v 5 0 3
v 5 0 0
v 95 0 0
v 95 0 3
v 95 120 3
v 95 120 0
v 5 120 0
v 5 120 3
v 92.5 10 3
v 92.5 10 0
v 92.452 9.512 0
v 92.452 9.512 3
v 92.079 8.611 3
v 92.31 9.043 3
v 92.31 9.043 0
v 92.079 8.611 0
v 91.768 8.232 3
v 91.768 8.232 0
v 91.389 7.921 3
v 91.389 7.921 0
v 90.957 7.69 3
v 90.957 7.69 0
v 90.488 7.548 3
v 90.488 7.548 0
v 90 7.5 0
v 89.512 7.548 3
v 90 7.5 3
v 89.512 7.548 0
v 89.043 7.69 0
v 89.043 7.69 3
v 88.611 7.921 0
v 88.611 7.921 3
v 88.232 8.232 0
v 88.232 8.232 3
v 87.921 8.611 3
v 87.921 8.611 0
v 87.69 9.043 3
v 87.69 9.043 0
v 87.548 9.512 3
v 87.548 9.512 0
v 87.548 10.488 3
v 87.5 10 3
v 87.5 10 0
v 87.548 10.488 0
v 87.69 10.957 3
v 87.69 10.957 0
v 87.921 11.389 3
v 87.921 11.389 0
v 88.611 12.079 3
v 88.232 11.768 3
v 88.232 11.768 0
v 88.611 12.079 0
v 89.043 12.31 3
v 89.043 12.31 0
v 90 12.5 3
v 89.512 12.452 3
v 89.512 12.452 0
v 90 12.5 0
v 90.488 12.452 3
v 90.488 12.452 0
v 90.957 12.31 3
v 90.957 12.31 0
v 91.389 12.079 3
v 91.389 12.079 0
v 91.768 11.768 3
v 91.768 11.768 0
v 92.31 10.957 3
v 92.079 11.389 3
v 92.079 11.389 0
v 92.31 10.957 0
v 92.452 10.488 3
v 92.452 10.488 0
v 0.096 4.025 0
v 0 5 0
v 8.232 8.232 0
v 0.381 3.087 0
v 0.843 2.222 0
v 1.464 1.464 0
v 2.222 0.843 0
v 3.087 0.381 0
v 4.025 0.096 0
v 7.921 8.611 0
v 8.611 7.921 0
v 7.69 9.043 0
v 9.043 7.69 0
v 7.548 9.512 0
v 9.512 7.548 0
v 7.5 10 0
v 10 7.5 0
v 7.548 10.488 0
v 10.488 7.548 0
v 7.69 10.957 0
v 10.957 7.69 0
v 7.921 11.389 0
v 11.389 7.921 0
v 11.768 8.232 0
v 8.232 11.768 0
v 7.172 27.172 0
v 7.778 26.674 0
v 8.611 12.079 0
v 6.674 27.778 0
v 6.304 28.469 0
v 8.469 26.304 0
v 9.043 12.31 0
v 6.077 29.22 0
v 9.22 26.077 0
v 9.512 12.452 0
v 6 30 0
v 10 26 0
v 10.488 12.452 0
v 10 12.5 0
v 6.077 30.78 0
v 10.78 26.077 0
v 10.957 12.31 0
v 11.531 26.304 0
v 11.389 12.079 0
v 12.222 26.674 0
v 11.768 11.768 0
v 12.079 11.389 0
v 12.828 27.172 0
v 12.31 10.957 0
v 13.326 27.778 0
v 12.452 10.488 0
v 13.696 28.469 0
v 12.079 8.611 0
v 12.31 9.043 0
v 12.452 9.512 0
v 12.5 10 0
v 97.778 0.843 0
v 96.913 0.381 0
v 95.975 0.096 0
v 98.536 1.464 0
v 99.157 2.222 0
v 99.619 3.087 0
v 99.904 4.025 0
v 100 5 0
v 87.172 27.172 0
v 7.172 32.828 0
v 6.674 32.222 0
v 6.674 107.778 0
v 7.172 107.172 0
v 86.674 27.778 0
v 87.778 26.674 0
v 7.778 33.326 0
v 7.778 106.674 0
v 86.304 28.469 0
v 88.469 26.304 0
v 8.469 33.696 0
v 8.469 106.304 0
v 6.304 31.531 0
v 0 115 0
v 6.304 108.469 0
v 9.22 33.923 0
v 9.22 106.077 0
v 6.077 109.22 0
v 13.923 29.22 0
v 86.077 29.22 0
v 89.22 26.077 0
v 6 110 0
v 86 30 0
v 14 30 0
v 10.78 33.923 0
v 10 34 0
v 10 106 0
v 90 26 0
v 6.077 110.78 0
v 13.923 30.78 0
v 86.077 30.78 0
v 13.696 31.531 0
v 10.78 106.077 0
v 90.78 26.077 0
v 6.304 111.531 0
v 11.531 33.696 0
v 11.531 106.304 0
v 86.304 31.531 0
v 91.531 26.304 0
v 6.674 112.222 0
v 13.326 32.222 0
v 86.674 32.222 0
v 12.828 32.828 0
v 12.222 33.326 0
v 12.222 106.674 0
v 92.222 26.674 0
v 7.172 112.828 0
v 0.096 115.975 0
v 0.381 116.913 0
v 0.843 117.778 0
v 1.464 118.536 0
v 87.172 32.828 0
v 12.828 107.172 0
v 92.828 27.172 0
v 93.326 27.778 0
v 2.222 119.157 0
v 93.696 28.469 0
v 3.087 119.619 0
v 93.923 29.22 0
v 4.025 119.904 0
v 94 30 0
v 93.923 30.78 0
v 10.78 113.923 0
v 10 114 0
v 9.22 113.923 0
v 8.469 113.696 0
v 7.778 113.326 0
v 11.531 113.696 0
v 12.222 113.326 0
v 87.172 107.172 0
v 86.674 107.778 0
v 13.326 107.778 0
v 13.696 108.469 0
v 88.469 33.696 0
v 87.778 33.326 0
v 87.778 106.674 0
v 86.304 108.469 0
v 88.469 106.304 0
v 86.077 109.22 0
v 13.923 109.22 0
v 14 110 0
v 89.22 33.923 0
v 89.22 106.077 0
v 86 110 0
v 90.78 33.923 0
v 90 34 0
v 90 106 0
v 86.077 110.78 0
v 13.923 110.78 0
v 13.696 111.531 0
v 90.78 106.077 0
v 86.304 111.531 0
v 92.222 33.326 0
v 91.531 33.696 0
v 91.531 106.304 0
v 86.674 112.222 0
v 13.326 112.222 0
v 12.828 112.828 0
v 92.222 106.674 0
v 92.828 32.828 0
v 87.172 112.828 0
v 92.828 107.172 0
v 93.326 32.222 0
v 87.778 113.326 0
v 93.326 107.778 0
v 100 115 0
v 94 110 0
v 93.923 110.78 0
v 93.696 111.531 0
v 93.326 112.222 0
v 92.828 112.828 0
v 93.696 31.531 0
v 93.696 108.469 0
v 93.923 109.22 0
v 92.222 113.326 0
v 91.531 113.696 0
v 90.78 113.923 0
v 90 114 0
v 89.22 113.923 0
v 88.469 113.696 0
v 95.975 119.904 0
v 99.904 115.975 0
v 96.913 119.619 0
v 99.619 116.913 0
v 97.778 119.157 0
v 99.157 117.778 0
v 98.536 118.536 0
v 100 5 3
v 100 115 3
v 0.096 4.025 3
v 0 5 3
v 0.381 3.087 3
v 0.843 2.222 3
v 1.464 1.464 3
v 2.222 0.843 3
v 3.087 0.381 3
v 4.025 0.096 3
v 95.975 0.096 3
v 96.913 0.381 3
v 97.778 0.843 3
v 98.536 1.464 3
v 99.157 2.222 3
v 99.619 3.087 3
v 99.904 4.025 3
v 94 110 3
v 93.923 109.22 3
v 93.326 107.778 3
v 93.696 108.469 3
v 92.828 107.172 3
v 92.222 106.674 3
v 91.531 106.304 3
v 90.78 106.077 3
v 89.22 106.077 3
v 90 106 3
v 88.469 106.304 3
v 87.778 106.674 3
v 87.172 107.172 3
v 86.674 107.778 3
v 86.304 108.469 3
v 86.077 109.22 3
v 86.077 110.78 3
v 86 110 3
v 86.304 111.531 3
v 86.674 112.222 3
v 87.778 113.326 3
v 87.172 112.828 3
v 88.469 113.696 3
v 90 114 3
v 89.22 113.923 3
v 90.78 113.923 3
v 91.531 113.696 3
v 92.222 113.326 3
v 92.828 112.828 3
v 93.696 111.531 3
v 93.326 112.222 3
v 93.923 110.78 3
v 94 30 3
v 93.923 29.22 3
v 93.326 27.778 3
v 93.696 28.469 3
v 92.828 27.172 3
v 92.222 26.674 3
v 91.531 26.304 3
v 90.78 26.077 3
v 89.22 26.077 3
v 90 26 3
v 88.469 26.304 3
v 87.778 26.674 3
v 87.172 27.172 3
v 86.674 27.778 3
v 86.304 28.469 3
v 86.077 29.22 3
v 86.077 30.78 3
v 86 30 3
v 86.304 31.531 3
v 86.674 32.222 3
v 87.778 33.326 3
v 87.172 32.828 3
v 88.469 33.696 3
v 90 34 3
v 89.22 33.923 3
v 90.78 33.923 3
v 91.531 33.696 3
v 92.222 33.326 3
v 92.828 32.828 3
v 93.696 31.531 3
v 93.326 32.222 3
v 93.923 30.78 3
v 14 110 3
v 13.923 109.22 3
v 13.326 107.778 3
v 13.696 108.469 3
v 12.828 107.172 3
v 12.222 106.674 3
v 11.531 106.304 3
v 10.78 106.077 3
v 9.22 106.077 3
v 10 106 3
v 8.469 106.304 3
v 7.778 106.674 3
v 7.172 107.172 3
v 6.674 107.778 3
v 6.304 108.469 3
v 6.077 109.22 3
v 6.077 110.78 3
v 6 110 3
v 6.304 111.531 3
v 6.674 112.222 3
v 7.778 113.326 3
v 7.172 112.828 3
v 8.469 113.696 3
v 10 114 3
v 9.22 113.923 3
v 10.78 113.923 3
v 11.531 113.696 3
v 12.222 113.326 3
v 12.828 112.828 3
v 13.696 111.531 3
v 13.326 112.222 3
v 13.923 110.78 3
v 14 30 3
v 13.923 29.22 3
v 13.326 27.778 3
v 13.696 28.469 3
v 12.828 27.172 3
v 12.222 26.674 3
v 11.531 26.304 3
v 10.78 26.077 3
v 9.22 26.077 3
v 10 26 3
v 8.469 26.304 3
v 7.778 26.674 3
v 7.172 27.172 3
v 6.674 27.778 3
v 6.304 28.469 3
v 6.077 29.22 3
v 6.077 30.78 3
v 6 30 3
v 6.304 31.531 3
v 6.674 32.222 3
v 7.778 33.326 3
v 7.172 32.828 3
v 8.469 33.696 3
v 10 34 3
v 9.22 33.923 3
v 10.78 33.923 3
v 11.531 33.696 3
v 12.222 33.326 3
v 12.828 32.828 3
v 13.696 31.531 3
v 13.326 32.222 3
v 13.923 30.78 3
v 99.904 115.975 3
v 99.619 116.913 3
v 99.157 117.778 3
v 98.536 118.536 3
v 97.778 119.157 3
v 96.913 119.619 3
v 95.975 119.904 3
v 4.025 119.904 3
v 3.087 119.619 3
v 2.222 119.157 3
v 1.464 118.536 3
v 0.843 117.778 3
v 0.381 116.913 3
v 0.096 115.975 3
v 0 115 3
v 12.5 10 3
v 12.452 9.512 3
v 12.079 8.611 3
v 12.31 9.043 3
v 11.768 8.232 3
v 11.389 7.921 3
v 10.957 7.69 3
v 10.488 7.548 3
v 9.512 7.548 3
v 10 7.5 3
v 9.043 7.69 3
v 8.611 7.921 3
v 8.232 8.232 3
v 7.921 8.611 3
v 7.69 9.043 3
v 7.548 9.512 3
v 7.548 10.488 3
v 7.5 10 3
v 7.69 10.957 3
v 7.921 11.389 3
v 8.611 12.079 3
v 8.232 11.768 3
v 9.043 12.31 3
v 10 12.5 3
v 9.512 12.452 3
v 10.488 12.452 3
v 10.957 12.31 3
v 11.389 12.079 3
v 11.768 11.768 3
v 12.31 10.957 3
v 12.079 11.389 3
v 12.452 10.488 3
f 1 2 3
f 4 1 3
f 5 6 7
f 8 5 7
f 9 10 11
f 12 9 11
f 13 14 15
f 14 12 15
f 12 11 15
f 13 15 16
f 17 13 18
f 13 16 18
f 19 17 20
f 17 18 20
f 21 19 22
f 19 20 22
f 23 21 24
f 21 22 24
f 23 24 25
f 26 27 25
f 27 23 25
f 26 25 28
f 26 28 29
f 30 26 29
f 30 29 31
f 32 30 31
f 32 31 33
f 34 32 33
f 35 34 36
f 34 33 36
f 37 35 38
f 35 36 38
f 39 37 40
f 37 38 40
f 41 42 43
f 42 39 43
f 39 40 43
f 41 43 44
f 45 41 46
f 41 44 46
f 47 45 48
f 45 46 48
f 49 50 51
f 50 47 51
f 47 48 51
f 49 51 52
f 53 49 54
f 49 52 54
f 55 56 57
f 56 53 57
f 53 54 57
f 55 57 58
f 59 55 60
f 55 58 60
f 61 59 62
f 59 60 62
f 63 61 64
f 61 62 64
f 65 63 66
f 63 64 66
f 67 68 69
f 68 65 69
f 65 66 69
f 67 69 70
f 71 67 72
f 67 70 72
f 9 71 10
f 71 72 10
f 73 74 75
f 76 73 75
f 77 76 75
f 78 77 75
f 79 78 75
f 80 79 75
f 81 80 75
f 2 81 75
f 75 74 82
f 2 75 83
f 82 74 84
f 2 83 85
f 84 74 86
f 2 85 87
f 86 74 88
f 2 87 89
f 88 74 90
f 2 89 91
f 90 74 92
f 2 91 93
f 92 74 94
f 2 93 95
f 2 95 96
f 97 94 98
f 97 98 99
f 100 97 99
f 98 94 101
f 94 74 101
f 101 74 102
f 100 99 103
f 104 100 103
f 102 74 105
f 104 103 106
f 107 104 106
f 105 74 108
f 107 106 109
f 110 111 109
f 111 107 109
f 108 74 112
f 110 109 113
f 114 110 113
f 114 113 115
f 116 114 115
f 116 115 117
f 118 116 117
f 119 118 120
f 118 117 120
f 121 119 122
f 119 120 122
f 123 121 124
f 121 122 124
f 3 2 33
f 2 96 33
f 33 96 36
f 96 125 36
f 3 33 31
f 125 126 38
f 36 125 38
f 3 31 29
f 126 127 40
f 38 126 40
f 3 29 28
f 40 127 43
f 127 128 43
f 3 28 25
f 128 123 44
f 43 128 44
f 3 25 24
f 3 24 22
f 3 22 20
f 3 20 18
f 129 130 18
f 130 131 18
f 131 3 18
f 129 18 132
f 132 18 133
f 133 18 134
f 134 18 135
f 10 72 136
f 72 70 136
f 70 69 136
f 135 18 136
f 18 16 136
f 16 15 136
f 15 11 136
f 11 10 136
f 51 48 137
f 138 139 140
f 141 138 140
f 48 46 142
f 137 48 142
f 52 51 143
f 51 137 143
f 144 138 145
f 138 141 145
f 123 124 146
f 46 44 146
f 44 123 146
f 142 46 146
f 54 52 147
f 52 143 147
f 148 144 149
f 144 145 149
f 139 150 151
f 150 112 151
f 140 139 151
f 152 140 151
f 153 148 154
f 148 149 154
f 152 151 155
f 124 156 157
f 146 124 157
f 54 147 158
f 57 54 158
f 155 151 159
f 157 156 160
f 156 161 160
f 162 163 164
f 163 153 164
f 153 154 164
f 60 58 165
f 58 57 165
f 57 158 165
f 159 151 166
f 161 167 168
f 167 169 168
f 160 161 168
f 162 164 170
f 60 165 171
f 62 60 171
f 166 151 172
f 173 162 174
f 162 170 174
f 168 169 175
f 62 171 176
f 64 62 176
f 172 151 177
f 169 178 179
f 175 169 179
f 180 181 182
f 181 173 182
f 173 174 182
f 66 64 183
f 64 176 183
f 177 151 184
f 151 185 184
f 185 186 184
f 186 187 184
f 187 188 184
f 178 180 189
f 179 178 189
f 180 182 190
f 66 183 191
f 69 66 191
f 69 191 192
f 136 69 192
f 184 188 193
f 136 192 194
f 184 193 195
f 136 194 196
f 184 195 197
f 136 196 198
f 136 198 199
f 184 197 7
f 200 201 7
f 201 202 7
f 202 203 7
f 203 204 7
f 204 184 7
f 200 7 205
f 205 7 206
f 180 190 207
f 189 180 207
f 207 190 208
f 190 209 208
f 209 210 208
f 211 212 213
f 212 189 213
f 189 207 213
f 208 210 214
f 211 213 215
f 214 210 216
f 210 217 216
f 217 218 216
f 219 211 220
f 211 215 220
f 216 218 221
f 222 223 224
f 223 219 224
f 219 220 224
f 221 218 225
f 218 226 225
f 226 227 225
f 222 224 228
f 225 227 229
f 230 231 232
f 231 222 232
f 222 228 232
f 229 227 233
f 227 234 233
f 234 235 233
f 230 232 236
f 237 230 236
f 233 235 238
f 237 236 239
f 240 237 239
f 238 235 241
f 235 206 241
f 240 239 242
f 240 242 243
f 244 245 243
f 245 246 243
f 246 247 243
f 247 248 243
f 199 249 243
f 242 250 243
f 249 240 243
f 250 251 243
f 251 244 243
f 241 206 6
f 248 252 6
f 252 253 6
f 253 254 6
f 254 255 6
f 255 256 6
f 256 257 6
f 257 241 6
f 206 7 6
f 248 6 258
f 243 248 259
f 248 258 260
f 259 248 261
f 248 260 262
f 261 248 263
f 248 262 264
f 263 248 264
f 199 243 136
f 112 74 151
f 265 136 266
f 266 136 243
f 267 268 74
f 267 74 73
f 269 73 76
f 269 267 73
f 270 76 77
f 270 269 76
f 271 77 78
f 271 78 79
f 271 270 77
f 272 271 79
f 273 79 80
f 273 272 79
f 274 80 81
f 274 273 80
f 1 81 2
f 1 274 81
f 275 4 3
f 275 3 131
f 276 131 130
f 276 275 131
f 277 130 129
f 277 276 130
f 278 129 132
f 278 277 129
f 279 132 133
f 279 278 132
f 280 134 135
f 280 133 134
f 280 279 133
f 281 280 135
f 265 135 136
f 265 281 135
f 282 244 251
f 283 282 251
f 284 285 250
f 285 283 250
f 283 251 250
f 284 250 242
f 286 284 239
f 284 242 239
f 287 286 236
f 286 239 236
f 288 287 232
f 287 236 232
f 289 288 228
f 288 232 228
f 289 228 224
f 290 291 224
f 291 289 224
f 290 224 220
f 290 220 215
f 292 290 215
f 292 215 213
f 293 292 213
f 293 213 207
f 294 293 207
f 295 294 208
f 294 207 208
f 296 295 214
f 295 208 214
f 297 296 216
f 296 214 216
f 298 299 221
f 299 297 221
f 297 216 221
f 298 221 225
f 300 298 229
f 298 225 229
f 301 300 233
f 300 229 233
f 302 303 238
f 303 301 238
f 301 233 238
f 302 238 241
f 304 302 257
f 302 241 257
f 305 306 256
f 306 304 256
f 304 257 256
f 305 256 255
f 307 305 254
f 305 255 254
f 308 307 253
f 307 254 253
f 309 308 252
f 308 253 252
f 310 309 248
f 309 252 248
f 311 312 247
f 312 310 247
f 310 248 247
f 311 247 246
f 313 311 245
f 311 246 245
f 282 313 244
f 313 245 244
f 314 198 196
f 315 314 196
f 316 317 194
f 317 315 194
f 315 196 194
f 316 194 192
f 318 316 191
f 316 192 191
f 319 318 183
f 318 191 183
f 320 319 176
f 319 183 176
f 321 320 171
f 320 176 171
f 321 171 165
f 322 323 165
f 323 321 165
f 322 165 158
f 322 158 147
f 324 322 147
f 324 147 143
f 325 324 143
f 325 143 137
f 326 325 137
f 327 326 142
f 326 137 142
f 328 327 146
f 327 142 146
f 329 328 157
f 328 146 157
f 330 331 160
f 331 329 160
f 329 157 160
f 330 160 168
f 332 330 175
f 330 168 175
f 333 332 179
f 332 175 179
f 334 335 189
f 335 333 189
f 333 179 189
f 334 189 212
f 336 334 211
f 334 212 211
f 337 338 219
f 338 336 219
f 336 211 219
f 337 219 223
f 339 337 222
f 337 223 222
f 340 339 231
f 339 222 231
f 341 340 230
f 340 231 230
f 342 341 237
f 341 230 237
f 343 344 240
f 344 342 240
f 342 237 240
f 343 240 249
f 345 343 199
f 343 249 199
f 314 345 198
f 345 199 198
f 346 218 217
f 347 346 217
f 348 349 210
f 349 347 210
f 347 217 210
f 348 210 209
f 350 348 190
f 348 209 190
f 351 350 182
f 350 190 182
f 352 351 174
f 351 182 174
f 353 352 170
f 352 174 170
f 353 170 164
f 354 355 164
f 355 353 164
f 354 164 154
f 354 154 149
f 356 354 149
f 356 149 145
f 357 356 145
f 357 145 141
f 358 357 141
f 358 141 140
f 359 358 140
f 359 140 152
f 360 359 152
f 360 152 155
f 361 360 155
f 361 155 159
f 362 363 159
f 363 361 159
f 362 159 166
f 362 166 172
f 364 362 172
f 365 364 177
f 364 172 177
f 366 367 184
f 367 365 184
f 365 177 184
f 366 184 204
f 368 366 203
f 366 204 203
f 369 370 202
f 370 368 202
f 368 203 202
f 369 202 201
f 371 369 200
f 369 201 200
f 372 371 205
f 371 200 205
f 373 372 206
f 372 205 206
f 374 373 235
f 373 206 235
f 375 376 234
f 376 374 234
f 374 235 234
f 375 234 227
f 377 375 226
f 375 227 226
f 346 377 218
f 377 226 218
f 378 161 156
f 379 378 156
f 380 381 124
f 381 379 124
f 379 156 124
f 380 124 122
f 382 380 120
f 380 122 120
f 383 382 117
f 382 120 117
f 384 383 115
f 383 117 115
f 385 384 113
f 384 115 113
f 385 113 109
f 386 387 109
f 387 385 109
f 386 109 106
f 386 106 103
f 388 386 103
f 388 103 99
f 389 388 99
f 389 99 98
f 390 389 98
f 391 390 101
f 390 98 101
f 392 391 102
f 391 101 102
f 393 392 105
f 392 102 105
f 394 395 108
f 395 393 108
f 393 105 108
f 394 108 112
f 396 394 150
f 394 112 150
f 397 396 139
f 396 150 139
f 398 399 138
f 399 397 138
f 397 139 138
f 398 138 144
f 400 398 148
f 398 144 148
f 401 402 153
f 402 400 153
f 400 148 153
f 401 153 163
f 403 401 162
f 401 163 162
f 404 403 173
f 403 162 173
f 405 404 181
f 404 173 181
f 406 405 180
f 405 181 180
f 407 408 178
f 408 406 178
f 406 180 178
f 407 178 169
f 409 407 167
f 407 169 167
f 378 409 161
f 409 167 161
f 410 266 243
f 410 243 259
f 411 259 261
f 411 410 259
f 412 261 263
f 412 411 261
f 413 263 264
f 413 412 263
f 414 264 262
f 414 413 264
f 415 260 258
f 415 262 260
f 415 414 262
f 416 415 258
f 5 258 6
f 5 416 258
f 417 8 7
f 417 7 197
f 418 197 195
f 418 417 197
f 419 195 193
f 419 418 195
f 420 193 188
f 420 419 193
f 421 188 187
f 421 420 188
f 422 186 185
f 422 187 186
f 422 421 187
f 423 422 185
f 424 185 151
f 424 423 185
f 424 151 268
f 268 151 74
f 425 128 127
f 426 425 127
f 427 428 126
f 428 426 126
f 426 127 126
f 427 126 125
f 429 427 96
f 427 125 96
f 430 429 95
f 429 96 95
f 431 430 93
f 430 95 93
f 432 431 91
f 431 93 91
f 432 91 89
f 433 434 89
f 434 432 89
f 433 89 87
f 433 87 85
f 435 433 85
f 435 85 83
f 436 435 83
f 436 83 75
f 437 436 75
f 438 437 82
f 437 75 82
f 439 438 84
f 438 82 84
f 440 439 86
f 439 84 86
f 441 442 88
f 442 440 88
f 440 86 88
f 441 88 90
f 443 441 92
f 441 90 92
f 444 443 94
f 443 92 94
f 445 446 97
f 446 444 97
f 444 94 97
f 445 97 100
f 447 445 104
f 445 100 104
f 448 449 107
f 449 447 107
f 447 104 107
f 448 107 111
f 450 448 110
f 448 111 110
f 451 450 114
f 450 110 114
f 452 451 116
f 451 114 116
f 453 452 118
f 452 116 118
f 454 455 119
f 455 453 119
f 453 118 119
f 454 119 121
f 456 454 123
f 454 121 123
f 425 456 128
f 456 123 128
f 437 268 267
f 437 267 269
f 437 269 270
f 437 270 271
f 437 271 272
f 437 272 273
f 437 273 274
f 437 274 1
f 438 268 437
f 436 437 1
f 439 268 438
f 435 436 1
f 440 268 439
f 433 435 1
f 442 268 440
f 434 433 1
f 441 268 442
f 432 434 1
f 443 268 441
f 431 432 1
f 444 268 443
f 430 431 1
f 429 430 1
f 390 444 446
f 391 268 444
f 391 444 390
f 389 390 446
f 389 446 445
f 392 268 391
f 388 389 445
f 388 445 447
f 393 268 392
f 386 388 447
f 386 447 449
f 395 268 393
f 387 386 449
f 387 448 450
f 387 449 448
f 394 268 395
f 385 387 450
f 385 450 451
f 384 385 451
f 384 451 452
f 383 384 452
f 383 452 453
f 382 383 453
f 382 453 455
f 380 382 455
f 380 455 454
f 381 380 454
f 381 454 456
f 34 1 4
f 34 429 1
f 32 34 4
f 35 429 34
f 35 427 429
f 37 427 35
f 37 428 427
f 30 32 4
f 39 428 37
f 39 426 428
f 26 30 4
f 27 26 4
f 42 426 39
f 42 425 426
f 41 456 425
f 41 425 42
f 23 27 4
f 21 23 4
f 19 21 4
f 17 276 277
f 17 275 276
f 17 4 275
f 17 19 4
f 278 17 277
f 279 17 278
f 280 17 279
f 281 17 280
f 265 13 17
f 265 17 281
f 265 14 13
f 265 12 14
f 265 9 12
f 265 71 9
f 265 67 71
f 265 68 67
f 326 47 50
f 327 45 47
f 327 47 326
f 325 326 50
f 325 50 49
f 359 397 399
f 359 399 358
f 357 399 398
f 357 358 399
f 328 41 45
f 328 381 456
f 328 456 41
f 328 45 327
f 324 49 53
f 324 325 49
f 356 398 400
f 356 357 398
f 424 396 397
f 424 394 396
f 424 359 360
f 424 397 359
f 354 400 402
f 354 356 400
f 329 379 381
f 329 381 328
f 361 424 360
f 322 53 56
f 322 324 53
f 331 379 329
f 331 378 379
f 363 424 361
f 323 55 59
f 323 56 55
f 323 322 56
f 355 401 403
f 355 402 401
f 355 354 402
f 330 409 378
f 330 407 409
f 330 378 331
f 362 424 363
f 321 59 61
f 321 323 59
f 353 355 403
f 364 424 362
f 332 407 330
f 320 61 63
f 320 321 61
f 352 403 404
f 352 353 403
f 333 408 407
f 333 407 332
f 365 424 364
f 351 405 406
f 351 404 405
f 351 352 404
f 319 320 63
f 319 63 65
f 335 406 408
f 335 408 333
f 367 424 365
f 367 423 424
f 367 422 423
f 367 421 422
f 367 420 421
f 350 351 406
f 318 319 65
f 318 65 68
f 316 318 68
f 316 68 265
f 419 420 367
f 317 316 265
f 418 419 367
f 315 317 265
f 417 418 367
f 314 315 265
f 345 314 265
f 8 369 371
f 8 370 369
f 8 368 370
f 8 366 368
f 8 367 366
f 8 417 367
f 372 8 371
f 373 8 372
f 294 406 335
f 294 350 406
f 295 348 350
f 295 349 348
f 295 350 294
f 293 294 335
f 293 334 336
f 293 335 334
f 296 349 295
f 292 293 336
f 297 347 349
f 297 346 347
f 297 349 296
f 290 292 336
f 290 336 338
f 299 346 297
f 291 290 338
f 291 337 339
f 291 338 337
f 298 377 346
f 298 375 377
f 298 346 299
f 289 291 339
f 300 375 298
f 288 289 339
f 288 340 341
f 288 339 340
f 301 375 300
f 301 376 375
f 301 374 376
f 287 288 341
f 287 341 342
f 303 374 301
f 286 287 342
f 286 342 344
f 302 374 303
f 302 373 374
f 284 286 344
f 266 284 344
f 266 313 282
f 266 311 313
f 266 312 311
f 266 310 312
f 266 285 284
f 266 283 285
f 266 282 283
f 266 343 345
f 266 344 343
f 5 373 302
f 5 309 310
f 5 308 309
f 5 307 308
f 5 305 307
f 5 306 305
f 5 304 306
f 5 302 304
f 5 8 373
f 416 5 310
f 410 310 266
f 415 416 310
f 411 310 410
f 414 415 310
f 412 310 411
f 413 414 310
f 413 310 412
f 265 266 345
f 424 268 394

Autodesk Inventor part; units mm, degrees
ref_plane "YZ Plane" through (0, 0, 0) normal (1, 0, 0) x (0, 1, 0)
ref_plane "XZ Plane" through (0, 0, 0) normal (0, 1, 0) x (-1, 0, 0)
ref_plane "XY Plane" through (0, 0, 0) normal (0, 0, 1) x (1, 0, 0)
sketch "スケッチ1" plane through (0, 0, 0) normal (0, 0, 1) x (1, 0, 0)
  line L0 (0, 0) -> (100, 0)
  line L1 (100, 0) -> (100, 120)
  line L2 (100, 120) -> (0, 120)
  line L3 (0, 120) -> (0, 0)
  line L4 (0, 10) -> (100, 10) construction
  circle A0 centre (10, 10) radius 2.5
  circle A1 centre (90, 10) radius 2.5
  circle A2 centre (10, 110) radius 4
  circle A3 centre (10, 30) radius 4
  circle A4 centre (90, 110) radius 4
  circle A5 centre (90, 30) radius 4
  line L5 (10, 110) -> (10, 30) construction
  line L6 (10, 30) -> (90, 30) construction
  line L7 (90, 30) -> (90, 110) construction
  line L8 (90, 110) -> (10, 110) construction
  dimension "d0" = 5
  dimension "d1" = 10
  dimension "d2" = 10
  dimension "d3" = 10
  dimension "d4" = 100
  dimension "d5" = 120
  dimension "d12" = 8
  dimension "d13" = 10
  dimension "d14" = 10
  dimension "d15" = 10
  dimension "d16" = 10
  dimension "d21" = 80
extrude "押し出し1" add sketch "スケッチ1" along normal blind 3
fillet "フィレット1" radius 5 4 edges at (100, 120, 1.5) (0, 120, 1.5) (100, 0, 1.5) (0, 0, 1.5)
properties part number "LRFマウント"
